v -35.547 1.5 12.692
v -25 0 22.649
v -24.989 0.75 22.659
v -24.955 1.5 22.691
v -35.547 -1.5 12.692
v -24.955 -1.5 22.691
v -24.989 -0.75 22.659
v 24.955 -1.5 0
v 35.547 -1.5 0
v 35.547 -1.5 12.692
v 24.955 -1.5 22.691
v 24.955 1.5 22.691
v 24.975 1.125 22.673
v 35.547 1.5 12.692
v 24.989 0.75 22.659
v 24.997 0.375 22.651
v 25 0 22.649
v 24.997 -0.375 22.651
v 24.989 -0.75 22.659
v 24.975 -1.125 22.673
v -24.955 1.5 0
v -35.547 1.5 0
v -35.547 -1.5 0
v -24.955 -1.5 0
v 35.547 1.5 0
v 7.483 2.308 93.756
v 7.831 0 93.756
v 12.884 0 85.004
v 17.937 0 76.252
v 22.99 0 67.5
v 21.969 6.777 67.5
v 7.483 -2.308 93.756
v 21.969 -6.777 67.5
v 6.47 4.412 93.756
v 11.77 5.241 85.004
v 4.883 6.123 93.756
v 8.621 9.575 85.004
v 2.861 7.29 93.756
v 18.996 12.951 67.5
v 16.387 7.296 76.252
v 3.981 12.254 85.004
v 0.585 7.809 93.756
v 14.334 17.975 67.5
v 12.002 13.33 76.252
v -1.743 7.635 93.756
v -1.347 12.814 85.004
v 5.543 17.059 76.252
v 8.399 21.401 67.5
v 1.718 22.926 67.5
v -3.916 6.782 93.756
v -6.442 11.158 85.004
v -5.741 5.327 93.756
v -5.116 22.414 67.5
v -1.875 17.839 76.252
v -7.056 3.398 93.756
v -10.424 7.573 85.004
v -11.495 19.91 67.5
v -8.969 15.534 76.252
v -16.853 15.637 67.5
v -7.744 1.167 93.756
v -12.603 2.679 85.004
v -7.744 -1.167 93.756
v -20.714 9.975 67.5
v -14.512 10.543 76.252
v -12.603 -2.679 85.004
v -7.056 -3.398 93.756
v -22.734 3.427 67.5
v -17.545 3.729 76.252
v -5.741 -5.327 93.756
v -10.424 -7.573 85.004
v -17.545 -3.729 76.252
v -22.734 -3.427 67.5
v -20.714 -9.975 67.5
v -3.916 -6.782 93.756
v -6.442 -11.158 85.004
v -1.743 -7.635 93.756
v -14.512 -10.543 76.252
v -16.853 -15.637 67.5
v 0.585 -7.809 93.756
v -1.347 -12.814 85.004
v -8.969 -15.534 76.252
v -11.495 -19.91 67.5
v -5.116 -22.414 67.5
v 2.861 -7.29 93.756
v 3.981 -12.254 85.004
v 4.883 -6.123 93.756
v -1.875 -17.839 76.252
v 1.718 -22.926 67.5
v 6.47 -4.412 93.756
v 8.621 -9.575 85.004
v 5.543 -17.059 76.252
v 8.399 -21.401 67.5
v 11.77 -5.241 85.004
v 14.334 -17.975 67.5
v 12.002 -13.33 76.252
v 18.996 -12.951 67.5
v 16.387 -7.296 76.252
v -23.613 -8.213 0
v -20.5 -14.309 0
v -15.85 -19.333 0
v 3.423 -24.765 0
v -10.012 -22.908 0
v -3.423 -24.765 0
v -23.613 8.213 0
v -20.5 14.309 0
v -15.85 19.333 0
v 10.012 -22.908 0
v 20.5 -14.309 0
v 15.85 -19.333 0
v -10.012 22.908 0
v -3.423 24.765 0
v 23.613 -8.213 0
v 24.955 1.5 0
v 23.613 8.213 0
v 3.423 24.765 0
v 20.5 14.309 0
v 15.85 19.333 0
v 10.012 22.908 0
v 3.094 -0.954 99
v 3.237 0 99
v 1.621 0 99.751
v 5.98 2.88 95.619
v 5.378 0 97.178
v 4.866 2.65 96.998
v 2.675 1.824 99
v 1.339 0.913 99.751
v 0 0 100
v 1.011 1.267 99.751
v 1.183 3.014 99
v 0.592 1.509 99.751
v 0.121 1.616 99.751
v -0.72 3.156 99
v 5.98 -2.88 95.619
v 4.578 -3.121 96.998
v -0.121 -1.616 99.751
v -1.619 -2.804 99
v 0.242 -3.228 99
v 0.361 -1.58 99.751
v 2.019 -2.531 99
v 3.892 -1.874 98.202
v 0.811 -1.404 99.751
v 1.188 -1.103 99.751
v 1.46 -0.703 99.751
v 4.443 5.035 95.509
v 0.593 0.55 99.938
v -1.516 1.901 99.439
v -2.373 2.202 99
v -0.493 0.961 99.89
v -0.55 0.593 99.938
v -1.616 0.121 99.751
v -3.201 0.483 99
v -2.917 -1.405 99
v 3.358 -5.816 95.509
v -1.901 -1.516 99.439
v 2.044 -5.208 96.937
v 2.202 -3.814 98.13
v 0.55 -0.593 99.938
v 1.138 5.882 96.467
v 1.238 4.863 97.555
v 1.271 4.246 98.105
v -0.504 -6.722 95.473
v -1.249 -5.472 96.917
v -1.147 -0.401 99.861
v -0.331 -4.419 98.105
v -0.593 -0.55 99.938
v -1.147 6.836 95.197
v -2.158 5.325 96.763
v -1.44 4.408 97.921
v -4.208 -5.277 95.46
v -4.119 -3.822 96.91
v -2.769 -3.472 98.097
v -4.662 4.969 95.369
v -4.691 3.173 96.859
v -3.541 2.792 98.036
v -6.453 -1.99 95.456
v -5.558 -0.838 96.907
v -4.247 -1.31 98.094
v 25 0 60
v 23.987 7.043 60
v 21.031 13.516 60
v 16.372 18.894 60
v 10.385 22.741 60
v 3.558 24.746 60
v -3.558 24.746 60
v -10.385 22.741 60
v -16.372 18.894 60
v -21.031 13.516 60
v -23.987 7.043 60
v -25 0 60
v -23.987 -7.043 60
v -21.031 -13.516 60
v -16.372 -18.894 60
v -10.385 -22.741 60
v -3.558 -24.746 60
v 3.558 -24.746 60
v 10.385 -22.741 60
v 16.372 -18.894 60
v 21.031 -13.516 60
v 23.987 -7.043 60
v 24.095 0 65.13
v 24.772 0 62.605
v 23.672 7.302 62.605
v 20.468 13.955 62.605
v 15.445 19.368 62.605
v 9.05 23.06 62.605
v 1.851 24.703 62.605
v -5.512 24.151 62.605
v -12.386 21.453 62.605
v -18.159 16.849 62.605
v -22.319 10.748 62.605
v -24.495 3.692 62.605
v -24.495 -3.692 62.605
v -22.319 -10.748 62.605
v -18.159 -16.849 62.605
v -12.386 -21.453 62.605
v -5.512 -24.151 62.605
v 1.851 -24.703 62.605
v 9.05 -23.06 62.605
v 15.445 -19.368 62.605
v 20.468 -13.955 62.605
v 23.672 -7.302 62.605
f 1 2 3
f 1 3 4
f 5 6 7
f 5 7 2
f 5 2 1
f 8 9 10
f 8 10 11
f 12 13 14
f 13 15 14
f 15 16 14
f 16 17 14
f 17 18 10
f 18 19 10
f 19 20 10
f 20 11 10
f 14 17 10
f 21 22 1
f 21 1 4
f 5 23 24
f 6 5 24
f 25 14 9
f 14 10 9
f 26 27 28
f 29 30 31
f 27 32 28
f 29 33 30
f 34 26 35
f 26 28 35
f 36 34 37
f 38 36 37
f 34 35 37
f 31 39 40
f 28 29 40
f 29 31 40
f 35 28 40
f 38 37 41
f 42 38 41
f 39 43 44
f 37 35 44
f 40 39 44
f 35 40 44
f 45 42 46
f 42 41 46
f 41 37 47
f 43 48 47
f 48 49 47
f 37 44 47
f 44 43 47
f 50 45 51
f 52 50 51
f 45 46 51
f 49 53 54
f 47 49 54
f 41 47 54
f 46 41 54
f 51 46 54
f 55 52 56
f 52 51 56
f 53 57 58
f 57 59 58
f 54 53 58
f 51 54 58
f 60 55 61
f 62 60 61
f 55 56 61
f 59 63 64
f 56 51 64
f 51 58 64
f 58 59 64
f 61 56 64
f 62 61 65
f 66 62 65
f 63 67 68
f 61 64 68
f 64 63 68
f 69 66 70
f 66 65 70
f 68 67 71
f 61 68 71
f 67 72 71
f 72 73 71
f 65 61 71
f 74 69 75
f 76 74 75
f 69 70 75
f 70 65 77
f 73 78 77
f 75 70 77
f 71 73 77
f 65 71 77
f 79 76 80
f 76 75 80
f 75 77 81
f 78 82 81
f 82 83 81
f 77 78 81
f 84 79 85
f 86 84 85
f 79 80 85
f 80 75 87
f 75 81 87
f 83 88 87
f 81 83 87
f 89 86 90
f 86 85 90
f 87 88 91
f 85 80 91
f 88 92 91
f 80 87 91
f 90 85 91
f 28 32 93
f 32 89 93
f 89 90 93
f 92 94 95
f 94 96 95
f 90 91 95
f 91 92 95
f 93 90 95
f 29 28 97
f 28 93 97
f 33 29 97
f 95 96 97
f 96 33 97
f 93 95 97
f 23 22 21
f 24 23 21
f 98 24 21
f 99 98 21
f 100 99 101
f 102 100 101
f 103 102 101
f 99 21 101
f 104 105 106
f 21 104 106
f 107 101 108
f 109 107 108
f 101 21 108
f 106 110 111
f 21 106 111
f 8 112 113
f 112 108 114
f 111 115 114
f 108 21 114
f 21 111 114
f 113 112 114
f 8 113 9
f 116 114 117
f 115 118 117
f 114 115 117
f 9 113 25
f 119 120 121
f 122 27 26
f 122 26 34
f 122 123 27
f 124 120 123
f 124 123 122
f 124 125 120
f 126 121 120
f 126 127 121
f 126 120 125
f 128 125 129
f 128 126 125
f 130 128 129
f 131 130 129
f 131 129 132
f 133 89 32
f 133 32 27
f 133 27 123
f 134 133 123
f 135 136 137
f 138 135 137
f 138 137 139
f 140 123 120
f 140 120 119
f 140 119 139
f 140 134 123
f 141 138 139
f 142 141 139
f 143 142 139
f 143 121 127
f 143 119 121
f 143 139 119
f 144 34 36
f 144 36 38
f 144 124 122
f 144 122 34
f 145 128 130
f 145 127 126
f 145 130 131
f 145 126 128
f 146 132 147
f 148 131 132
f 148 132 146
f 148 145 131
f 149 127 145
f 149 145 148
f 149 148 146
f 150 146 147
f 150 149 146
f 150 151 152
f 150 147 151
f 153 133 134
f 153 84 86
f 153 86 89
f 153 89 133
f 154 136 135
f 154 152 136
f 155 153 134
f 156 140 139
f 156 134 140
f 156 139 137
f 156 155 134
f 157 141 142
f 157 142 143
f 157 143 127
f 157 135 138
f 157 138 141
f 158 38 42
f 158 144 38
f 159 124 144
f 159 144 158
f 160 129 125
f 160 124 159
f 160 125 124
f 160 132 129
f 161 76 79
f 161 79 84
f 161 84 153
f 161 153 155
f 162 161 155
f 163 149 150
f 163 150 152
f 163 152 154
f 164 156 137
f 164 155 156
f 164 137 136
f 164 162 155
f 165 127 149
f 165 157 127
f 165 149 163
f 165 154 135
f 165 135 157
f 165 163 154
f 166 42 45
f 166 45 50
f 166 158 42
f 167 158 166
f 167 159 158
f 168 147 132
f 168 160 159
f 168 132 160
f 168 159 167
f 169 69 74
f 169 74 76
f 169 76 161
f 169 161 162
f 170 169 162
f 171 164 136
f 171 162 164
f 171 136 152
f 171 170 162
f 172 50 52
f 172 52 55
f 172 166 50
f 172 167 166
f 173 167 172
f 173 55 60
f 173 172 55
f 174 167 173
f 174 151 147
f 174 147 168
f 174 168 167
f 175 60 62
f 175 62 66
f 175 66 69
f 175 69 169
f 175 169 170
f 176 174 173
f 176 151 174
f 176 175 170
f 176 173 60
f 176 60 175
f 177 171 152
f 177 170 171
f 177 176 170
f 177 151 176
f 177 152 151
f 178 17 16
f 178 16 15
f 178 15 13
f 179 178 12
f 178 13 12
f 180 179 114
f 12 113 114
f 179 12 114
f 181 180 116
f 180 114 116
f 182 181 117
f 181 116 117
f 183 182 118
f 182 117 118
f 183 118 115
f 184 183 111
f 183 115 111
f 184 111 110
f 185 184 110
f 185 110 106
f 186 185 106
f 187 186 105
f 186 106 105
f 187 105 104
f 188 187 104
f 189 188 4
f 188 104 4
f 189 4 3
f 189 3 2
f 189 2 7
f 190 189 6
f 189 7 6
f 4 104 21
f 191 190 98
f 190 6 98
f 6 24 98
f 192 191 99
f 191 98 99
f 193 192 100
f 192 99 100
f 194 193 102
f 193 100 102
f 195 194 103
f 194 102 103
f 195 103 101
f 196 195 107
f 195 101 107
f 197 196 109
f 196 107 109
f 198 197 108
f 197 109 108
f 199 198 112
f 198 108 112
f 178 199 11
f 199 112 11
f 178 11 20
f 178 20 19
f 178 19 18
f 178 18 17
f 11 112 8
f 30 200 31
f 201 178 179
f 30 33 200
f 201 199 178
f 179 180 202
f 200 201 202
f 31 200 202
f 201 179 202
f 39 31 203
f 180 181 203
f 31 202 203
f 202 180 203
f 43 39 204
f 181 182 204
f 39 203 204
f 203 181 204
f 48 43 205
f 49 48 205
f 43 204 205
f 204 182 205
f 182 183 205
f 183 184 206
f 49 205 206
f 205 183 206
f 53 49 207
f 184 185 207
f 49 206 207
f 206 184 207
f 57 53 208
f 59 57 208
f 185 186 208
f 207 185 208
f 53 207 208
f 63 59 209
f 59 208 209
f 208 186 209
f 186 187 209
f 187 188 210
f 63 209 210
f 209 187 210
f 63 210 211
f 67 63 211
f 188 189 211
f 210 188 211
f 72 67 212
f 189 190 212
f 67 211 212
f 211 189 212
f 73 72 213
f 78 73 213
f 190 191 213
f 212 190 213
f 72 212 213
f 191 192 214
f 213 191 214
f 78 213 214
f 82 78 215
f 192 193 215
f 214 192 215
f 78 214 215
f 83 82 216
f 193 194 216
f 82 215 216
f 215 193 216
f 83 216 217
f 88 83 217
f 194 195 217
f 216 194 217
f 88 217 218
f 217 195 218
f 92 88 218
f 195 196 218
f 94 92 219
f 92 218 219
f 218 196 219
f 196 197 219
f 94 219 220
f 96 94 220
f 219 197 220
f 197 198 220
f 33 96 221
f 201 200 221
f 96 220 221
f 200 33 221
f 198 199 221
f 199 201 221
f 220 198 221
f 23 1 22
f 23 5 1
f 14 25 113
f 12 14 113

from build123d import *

# Parameters (mm, degrees)
PAD_DEPTH = 1.5


with BuildPart() as part:
    # Sketch → Revolution (revolve)
    with BuildSketch(Plane.XZ):
        with BuildLine():
            Line((0, 0), (0, 100))
            add(Edge.make_bspline(
                [(7.831253, 93.75638), (4.226497, 100), (0, 100)],
                knots=[2.592301, 2.592301, 2.592301, 3.141593, 3.141593, 3.141593], degree=2, weights=[1, 0.962521, 1]))
            Line((7.831253, 93.75638), (22.990381, 67.5))
            ThreePointArc((22.990381, 67.5), (24.488887, 63.882286), (25, 60))
            Line((25, 60), (25, 0))
            Line((25, 0), (0, 0))
        make_face()
    revolve(axis=Axis((0, 0, 0), (0, 0, 1)))

    # Sketch001 → Pad (new body, symmetric)
    with BuildSketch(Plane(origin=(24, 0, 0), x_dir=(1, 0, 0), z_dir=(0, -1, 0))):
        Polygon((0, 23.592846), (11.547151, 12.692001), (11.547151, 0), (0, 0), align=None)
    pad = extrude(amount=PAD_DEPTH, both=True)

    # Mirrored: Pad across YZ
    add(pad.mirror(Plane.YZ))


solid = part.part
